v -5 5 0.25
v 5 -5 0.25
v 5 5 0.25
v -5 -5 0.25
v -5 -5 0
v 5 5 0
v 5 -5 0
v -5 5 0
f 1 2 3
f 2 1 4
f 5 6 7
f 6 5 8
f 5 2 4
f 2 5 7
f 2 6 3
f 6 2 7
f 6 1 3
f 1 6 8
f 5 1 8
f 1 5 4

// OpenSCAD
module table(){
    color( [1, 1, 1, 1]) //white HDPE
    {
        translate([0,0,1/8])
        cube(size = [10,10,1/4], center = true);
    }
}
table();
